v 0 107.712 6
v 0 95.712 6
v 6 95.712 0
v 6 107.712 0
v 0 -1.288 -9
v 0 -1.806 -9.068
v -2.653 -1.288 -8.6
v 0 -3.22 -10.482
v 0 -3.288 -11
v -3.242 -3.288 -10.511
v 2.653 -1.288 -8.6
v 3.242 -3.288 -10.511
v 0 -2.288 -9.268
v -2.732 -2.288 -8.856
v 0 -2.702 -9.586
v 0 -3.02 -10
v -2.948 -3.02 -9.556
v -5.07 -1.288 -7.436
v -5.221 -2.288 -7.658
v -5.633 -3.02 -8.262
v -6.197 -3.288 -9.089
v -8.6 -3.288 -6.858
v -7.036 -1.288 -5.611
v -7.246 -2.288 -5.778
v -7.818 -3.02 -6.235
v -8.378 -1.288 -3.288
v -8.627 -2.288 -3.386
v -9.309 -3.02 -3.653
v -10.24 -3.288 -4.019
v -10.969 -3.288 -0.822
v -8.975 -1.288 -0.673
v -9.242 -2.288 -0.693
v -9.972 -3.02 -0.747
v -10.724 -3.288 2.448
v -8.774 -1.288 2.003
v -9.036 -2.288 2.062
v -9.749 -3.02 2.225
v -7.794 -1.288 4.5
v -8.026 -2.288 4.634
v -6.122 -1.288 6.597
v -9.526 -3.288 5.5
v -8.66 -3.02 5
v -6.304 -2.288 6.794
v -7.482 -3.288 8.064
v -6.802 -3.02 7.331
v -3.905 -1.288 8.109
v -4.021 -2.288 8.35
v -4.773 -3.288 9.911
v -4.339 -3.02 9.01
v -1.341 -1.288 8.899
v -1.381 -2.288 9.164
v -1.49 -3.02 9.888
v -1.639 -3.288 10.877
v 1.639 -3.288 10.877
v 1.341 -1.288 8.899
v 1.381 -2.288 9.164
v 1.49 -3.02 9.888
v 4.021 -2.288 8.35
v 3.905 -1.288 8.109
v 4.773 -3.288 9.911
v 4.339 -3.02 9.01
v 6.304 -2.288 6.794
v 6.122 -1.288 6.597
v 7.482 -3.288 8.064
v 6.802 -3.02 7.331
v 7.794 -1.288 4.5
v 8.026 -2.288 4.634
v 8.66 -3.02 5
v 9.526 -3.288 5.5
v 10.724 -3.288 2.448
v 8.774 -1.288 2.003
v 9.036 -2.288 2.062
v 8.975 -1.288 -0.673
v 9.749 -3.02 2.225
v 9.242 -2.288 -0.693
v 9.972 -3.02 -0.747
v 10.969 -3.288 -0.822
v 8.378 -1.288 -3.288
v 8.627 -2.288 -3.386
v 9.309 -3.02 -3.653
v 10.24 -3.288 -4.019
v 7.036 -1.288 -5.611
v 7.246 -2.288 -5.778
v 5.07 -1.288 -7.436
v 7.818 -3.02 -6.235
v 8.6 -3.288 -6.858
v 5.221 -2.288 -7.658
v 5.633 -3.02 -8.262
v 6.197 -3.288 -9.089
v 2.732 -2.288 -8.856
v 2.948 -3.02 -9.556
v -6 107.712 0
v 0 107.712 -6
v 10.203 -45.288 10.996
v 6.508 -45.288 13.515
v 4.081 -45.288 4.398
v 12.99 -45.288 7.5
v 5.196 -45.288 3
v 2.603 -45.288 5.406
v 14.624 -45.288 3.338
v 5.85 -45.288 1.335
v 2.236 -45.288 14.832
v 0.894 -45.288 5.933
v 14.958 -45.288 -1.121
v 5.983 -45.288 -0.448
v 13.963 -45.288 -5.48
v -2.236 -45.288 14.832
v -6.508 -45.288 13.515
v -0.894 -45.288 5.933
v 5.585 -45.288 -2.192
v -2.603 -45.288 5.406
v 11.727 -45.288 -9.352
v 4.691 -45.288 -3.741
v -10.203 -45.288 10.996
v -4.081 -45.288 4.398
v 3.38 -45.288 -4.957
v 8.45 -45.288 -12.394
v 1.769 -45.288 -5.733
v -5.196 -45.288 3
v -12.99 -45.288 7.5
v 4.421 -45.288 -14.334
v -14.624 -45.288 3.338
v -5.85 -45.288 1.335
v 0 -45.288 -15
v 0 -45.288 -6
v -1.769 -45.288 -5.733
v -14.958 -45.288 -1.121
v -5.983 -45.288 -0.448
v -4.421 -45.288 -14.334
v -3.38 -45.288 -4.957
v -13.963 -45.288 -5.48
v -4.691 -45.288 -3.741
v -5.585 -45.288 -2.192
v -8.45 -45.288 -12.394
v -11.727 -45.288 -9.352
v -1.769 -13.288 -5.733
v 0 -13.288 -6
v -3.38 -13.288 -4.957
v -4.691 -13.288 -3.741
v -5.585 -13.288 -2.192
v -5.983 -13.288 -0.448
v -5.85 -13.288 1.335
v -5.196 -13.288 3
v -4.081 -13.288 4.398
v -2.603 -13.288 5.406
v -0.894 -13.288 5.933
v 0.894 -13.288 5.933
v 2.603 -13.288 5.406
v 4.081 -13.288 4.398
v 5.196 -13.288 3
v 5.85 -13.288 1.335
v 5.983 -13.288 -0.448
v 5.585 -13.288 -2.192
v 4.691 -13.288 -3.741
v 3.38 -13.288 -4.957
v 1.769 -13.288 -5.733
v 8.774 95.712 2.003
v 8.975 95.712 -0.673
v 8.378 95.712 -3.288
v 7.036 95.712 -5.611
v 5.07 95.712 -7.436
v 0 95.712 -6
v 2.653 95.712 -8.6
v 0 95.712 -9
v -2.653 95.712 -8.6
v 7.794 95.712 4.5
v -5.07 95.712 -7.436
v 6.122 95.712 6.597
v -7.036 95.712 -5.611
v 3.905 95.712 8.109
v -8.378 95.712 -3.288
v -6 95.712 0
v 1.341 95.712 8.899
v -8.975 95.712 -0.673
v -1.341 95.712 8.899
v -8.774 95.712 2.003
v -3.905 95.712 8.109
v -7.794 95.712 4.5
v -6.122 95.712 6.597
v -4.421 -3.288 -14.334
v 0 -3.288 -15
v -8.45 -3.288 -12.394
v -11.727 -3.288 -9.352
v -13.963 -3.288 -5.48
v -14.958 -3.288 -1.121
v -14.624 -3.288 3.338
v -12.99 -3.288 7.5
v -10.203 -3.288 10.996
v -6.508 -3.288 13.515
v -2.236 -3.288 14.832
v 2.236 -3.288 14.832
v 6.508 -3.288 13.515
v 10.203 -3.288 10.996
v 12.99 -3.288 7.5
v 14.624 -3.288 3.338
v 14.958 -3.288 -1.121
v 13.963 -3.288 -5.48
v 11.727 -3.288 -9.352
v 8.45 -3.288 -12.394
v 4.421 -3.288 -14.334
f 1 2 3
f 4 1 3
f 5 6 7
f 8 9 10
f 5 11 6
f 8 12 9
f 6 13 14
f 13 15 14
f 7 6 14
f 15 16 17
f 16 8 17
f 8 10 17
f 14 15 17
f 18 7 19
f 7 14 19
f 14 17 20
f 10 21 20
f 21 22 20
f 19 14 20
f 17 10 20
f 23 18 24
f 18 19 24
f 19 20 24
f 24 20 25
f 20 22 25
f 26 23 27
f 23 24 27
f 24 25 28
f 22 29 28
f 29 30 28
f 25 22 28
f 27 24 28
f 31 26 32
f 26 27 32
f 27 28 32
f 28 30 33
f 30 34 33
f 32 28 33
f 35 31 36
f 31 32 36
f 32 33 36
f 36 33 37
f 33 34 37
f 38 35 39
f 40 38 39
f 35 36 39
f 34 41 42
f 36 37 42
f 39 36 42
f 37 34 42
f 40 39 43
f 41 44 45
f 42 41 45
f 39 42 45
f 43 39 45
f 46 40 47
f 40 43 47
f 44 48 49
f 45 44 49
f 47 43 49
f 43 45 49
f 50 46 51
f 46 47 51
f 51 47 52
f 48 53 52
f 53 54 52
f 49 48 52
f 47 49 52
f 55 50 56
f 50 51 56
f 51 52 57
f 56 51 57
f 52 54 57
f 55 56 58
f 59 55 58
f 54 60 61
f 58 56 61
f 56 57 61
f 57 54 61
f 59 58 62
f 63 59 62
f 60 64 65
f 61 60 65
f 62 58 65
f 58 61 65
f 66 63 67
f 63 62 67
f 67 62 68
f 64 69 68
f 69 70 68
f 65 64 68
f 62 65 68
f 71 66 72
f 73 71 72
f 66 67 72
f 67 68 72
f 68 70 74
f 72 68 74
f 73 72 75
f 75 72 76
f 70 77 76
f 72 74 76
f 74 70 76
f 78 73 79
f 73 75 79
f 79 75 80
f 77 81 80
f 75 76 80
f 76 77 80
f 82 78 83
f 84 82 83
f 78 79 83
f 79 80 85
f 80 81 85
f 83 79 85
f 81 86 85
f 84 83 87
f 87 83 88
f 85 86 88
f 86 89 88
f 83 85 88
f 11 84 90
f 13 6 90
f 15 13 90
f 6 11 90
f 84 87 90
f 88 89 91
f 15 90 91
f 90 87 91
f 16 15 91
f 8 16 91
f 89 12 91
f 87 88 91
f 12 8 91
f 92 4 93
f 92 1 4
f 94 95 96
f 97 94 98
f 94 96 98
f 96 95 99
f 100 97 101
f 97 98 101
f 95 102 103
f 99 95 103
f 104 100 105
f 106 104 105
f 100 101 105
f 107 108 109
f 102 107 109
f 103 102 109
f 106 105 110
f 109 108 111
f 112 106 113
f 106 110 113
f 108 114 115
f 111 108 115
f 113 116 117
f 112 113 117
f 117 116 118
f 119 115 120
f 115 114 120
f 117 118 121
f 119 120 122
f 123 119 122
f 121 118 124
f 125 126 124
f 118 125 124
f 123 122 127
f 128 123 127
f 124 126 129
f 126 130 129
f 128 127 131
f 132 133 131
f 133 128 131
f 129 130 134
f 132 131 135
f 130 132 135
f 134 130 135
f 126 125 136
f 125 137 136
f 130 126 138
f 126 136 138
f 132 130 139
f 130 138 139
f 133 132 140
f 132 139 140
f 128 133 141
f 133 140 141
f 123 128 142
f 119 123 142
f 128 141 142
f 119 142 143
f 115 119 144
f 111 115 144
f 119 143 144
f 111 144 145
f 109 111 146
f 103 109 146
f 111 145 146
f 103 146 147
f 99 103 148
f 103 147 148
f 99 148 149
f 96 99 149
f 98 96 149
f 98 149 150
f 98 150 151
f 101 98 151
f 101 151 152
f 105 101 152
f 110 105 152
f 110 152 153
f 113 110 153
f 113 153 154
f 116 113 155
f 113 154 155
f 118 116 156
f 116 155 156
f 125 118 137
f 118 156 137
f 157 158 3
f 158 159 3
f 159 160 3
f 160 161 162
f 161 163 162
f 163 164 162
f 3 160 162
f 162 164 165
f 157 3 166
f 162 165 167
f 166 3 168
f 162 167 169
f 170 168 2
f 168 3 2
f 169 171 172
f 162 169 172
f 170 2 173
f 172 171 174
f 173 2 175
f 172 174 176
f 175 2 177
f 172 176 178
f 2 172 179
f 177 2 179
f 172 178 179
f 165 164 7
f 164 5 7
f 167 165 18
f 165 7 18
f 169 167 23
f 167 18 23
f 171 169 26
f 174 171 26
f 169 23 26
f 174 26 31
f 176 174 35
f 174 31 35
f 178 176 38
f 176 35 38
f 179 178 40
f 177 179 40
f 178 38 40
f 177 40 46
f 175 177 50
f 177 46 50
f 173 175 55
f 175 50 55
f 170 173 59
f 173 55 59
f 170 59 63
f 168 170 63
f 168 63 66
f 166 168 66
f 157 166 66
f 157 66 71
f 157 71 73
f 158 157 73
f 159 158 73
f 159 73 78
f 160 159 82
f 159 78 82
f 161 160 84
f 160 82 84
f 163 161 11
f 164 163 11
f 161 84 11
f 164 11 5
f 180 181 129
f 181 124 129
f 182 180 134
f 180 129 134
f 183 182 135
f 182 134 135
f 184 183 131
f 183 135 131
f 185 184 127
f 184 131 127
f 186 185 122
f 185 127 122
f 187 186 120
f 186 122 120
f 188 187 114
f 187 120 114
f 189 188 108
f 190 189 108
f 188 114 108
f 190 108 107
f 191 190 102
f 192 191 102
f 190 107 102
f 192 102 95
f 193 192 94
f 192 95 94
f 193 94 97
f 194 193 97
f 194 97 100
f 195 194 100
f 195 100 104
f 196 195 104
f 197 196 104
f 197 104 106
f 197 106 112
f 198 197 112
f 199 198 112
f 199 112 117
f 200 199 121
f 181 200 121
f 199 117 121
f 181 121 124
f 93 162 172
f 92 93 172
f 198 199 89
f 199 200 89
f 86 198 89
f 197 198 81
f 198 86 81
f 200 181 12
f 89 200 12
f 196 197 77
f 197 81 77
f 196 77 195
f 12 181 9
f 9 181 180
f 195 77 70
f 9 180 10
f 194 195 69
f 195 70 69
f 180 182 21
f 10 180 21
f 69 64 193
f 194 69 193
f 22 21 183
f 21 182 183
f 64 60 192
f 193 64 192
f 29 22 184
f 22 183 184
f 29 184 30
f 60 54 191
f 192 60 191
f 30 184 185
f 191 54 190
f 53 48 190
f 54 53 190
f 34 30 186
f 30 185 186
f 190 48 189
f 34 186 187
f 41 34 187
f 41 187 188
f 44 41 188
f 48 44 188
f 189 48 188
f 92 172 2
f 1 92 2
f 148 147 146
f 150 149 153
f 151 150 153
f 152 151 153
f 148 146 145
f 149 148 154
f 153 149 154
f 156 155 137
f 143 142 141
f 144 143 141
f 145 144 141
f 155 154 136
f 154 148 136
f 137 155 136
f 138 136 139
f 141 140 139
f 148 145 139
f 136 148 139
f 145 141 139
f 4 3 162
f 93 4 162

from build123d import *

# Parameters (mm, degrees)
EXTRUDE1_DEPTH = 12


with BuildPart() as part:
    # Sketch1 → Revolve1 (revolve)
    with BuildSketch(Plane.XY, mode=Mode.PRIVATE) as revolve1_sk:
        with BuildLine():
            Line((0, 95.711947491), (-9, 95.711947491))
            Line((-9, 95.711947491), (-9, -1.288052509))
            ThreePointArc((-9, -1.288052509), (-9.585786438, -2.702266071), (-11, -3.288052509))
            Line((-11, -3.288052509), (-15, -3.288052509))
            Line((-15, -3.288052509), (-15, -45.288052509))
            Line((-15, -45.288052509), (-6, -45.288052509))
            Line((-6, -45.288052509), (-6, -13.288052509))
            Line((-6, -13.288052509), (0, -13.288052509))
            Line((0, -13.288052509), (0, 95.711947491))
        make_face()
    revolve(revolve1_sk.sketch.rotate(Axis((0, 0, 0), (0, 1, 0)), 270), axis=Axis((0, 0, 0), (0, 1, 0)))

    # Sketch2 → Extrude1 (add)
    with BuildSketch(Plane(origin=(0, 95.711947491, 0), x_dir=(-1, 0, 0), z_dir=(0, 1, 0))):
        Polygon((-6, 0), (0, -6), (6, 0), (0, 6), align=None)
    extrude(amount=EXTRUDE1_DEPTH)


solid = part.part
